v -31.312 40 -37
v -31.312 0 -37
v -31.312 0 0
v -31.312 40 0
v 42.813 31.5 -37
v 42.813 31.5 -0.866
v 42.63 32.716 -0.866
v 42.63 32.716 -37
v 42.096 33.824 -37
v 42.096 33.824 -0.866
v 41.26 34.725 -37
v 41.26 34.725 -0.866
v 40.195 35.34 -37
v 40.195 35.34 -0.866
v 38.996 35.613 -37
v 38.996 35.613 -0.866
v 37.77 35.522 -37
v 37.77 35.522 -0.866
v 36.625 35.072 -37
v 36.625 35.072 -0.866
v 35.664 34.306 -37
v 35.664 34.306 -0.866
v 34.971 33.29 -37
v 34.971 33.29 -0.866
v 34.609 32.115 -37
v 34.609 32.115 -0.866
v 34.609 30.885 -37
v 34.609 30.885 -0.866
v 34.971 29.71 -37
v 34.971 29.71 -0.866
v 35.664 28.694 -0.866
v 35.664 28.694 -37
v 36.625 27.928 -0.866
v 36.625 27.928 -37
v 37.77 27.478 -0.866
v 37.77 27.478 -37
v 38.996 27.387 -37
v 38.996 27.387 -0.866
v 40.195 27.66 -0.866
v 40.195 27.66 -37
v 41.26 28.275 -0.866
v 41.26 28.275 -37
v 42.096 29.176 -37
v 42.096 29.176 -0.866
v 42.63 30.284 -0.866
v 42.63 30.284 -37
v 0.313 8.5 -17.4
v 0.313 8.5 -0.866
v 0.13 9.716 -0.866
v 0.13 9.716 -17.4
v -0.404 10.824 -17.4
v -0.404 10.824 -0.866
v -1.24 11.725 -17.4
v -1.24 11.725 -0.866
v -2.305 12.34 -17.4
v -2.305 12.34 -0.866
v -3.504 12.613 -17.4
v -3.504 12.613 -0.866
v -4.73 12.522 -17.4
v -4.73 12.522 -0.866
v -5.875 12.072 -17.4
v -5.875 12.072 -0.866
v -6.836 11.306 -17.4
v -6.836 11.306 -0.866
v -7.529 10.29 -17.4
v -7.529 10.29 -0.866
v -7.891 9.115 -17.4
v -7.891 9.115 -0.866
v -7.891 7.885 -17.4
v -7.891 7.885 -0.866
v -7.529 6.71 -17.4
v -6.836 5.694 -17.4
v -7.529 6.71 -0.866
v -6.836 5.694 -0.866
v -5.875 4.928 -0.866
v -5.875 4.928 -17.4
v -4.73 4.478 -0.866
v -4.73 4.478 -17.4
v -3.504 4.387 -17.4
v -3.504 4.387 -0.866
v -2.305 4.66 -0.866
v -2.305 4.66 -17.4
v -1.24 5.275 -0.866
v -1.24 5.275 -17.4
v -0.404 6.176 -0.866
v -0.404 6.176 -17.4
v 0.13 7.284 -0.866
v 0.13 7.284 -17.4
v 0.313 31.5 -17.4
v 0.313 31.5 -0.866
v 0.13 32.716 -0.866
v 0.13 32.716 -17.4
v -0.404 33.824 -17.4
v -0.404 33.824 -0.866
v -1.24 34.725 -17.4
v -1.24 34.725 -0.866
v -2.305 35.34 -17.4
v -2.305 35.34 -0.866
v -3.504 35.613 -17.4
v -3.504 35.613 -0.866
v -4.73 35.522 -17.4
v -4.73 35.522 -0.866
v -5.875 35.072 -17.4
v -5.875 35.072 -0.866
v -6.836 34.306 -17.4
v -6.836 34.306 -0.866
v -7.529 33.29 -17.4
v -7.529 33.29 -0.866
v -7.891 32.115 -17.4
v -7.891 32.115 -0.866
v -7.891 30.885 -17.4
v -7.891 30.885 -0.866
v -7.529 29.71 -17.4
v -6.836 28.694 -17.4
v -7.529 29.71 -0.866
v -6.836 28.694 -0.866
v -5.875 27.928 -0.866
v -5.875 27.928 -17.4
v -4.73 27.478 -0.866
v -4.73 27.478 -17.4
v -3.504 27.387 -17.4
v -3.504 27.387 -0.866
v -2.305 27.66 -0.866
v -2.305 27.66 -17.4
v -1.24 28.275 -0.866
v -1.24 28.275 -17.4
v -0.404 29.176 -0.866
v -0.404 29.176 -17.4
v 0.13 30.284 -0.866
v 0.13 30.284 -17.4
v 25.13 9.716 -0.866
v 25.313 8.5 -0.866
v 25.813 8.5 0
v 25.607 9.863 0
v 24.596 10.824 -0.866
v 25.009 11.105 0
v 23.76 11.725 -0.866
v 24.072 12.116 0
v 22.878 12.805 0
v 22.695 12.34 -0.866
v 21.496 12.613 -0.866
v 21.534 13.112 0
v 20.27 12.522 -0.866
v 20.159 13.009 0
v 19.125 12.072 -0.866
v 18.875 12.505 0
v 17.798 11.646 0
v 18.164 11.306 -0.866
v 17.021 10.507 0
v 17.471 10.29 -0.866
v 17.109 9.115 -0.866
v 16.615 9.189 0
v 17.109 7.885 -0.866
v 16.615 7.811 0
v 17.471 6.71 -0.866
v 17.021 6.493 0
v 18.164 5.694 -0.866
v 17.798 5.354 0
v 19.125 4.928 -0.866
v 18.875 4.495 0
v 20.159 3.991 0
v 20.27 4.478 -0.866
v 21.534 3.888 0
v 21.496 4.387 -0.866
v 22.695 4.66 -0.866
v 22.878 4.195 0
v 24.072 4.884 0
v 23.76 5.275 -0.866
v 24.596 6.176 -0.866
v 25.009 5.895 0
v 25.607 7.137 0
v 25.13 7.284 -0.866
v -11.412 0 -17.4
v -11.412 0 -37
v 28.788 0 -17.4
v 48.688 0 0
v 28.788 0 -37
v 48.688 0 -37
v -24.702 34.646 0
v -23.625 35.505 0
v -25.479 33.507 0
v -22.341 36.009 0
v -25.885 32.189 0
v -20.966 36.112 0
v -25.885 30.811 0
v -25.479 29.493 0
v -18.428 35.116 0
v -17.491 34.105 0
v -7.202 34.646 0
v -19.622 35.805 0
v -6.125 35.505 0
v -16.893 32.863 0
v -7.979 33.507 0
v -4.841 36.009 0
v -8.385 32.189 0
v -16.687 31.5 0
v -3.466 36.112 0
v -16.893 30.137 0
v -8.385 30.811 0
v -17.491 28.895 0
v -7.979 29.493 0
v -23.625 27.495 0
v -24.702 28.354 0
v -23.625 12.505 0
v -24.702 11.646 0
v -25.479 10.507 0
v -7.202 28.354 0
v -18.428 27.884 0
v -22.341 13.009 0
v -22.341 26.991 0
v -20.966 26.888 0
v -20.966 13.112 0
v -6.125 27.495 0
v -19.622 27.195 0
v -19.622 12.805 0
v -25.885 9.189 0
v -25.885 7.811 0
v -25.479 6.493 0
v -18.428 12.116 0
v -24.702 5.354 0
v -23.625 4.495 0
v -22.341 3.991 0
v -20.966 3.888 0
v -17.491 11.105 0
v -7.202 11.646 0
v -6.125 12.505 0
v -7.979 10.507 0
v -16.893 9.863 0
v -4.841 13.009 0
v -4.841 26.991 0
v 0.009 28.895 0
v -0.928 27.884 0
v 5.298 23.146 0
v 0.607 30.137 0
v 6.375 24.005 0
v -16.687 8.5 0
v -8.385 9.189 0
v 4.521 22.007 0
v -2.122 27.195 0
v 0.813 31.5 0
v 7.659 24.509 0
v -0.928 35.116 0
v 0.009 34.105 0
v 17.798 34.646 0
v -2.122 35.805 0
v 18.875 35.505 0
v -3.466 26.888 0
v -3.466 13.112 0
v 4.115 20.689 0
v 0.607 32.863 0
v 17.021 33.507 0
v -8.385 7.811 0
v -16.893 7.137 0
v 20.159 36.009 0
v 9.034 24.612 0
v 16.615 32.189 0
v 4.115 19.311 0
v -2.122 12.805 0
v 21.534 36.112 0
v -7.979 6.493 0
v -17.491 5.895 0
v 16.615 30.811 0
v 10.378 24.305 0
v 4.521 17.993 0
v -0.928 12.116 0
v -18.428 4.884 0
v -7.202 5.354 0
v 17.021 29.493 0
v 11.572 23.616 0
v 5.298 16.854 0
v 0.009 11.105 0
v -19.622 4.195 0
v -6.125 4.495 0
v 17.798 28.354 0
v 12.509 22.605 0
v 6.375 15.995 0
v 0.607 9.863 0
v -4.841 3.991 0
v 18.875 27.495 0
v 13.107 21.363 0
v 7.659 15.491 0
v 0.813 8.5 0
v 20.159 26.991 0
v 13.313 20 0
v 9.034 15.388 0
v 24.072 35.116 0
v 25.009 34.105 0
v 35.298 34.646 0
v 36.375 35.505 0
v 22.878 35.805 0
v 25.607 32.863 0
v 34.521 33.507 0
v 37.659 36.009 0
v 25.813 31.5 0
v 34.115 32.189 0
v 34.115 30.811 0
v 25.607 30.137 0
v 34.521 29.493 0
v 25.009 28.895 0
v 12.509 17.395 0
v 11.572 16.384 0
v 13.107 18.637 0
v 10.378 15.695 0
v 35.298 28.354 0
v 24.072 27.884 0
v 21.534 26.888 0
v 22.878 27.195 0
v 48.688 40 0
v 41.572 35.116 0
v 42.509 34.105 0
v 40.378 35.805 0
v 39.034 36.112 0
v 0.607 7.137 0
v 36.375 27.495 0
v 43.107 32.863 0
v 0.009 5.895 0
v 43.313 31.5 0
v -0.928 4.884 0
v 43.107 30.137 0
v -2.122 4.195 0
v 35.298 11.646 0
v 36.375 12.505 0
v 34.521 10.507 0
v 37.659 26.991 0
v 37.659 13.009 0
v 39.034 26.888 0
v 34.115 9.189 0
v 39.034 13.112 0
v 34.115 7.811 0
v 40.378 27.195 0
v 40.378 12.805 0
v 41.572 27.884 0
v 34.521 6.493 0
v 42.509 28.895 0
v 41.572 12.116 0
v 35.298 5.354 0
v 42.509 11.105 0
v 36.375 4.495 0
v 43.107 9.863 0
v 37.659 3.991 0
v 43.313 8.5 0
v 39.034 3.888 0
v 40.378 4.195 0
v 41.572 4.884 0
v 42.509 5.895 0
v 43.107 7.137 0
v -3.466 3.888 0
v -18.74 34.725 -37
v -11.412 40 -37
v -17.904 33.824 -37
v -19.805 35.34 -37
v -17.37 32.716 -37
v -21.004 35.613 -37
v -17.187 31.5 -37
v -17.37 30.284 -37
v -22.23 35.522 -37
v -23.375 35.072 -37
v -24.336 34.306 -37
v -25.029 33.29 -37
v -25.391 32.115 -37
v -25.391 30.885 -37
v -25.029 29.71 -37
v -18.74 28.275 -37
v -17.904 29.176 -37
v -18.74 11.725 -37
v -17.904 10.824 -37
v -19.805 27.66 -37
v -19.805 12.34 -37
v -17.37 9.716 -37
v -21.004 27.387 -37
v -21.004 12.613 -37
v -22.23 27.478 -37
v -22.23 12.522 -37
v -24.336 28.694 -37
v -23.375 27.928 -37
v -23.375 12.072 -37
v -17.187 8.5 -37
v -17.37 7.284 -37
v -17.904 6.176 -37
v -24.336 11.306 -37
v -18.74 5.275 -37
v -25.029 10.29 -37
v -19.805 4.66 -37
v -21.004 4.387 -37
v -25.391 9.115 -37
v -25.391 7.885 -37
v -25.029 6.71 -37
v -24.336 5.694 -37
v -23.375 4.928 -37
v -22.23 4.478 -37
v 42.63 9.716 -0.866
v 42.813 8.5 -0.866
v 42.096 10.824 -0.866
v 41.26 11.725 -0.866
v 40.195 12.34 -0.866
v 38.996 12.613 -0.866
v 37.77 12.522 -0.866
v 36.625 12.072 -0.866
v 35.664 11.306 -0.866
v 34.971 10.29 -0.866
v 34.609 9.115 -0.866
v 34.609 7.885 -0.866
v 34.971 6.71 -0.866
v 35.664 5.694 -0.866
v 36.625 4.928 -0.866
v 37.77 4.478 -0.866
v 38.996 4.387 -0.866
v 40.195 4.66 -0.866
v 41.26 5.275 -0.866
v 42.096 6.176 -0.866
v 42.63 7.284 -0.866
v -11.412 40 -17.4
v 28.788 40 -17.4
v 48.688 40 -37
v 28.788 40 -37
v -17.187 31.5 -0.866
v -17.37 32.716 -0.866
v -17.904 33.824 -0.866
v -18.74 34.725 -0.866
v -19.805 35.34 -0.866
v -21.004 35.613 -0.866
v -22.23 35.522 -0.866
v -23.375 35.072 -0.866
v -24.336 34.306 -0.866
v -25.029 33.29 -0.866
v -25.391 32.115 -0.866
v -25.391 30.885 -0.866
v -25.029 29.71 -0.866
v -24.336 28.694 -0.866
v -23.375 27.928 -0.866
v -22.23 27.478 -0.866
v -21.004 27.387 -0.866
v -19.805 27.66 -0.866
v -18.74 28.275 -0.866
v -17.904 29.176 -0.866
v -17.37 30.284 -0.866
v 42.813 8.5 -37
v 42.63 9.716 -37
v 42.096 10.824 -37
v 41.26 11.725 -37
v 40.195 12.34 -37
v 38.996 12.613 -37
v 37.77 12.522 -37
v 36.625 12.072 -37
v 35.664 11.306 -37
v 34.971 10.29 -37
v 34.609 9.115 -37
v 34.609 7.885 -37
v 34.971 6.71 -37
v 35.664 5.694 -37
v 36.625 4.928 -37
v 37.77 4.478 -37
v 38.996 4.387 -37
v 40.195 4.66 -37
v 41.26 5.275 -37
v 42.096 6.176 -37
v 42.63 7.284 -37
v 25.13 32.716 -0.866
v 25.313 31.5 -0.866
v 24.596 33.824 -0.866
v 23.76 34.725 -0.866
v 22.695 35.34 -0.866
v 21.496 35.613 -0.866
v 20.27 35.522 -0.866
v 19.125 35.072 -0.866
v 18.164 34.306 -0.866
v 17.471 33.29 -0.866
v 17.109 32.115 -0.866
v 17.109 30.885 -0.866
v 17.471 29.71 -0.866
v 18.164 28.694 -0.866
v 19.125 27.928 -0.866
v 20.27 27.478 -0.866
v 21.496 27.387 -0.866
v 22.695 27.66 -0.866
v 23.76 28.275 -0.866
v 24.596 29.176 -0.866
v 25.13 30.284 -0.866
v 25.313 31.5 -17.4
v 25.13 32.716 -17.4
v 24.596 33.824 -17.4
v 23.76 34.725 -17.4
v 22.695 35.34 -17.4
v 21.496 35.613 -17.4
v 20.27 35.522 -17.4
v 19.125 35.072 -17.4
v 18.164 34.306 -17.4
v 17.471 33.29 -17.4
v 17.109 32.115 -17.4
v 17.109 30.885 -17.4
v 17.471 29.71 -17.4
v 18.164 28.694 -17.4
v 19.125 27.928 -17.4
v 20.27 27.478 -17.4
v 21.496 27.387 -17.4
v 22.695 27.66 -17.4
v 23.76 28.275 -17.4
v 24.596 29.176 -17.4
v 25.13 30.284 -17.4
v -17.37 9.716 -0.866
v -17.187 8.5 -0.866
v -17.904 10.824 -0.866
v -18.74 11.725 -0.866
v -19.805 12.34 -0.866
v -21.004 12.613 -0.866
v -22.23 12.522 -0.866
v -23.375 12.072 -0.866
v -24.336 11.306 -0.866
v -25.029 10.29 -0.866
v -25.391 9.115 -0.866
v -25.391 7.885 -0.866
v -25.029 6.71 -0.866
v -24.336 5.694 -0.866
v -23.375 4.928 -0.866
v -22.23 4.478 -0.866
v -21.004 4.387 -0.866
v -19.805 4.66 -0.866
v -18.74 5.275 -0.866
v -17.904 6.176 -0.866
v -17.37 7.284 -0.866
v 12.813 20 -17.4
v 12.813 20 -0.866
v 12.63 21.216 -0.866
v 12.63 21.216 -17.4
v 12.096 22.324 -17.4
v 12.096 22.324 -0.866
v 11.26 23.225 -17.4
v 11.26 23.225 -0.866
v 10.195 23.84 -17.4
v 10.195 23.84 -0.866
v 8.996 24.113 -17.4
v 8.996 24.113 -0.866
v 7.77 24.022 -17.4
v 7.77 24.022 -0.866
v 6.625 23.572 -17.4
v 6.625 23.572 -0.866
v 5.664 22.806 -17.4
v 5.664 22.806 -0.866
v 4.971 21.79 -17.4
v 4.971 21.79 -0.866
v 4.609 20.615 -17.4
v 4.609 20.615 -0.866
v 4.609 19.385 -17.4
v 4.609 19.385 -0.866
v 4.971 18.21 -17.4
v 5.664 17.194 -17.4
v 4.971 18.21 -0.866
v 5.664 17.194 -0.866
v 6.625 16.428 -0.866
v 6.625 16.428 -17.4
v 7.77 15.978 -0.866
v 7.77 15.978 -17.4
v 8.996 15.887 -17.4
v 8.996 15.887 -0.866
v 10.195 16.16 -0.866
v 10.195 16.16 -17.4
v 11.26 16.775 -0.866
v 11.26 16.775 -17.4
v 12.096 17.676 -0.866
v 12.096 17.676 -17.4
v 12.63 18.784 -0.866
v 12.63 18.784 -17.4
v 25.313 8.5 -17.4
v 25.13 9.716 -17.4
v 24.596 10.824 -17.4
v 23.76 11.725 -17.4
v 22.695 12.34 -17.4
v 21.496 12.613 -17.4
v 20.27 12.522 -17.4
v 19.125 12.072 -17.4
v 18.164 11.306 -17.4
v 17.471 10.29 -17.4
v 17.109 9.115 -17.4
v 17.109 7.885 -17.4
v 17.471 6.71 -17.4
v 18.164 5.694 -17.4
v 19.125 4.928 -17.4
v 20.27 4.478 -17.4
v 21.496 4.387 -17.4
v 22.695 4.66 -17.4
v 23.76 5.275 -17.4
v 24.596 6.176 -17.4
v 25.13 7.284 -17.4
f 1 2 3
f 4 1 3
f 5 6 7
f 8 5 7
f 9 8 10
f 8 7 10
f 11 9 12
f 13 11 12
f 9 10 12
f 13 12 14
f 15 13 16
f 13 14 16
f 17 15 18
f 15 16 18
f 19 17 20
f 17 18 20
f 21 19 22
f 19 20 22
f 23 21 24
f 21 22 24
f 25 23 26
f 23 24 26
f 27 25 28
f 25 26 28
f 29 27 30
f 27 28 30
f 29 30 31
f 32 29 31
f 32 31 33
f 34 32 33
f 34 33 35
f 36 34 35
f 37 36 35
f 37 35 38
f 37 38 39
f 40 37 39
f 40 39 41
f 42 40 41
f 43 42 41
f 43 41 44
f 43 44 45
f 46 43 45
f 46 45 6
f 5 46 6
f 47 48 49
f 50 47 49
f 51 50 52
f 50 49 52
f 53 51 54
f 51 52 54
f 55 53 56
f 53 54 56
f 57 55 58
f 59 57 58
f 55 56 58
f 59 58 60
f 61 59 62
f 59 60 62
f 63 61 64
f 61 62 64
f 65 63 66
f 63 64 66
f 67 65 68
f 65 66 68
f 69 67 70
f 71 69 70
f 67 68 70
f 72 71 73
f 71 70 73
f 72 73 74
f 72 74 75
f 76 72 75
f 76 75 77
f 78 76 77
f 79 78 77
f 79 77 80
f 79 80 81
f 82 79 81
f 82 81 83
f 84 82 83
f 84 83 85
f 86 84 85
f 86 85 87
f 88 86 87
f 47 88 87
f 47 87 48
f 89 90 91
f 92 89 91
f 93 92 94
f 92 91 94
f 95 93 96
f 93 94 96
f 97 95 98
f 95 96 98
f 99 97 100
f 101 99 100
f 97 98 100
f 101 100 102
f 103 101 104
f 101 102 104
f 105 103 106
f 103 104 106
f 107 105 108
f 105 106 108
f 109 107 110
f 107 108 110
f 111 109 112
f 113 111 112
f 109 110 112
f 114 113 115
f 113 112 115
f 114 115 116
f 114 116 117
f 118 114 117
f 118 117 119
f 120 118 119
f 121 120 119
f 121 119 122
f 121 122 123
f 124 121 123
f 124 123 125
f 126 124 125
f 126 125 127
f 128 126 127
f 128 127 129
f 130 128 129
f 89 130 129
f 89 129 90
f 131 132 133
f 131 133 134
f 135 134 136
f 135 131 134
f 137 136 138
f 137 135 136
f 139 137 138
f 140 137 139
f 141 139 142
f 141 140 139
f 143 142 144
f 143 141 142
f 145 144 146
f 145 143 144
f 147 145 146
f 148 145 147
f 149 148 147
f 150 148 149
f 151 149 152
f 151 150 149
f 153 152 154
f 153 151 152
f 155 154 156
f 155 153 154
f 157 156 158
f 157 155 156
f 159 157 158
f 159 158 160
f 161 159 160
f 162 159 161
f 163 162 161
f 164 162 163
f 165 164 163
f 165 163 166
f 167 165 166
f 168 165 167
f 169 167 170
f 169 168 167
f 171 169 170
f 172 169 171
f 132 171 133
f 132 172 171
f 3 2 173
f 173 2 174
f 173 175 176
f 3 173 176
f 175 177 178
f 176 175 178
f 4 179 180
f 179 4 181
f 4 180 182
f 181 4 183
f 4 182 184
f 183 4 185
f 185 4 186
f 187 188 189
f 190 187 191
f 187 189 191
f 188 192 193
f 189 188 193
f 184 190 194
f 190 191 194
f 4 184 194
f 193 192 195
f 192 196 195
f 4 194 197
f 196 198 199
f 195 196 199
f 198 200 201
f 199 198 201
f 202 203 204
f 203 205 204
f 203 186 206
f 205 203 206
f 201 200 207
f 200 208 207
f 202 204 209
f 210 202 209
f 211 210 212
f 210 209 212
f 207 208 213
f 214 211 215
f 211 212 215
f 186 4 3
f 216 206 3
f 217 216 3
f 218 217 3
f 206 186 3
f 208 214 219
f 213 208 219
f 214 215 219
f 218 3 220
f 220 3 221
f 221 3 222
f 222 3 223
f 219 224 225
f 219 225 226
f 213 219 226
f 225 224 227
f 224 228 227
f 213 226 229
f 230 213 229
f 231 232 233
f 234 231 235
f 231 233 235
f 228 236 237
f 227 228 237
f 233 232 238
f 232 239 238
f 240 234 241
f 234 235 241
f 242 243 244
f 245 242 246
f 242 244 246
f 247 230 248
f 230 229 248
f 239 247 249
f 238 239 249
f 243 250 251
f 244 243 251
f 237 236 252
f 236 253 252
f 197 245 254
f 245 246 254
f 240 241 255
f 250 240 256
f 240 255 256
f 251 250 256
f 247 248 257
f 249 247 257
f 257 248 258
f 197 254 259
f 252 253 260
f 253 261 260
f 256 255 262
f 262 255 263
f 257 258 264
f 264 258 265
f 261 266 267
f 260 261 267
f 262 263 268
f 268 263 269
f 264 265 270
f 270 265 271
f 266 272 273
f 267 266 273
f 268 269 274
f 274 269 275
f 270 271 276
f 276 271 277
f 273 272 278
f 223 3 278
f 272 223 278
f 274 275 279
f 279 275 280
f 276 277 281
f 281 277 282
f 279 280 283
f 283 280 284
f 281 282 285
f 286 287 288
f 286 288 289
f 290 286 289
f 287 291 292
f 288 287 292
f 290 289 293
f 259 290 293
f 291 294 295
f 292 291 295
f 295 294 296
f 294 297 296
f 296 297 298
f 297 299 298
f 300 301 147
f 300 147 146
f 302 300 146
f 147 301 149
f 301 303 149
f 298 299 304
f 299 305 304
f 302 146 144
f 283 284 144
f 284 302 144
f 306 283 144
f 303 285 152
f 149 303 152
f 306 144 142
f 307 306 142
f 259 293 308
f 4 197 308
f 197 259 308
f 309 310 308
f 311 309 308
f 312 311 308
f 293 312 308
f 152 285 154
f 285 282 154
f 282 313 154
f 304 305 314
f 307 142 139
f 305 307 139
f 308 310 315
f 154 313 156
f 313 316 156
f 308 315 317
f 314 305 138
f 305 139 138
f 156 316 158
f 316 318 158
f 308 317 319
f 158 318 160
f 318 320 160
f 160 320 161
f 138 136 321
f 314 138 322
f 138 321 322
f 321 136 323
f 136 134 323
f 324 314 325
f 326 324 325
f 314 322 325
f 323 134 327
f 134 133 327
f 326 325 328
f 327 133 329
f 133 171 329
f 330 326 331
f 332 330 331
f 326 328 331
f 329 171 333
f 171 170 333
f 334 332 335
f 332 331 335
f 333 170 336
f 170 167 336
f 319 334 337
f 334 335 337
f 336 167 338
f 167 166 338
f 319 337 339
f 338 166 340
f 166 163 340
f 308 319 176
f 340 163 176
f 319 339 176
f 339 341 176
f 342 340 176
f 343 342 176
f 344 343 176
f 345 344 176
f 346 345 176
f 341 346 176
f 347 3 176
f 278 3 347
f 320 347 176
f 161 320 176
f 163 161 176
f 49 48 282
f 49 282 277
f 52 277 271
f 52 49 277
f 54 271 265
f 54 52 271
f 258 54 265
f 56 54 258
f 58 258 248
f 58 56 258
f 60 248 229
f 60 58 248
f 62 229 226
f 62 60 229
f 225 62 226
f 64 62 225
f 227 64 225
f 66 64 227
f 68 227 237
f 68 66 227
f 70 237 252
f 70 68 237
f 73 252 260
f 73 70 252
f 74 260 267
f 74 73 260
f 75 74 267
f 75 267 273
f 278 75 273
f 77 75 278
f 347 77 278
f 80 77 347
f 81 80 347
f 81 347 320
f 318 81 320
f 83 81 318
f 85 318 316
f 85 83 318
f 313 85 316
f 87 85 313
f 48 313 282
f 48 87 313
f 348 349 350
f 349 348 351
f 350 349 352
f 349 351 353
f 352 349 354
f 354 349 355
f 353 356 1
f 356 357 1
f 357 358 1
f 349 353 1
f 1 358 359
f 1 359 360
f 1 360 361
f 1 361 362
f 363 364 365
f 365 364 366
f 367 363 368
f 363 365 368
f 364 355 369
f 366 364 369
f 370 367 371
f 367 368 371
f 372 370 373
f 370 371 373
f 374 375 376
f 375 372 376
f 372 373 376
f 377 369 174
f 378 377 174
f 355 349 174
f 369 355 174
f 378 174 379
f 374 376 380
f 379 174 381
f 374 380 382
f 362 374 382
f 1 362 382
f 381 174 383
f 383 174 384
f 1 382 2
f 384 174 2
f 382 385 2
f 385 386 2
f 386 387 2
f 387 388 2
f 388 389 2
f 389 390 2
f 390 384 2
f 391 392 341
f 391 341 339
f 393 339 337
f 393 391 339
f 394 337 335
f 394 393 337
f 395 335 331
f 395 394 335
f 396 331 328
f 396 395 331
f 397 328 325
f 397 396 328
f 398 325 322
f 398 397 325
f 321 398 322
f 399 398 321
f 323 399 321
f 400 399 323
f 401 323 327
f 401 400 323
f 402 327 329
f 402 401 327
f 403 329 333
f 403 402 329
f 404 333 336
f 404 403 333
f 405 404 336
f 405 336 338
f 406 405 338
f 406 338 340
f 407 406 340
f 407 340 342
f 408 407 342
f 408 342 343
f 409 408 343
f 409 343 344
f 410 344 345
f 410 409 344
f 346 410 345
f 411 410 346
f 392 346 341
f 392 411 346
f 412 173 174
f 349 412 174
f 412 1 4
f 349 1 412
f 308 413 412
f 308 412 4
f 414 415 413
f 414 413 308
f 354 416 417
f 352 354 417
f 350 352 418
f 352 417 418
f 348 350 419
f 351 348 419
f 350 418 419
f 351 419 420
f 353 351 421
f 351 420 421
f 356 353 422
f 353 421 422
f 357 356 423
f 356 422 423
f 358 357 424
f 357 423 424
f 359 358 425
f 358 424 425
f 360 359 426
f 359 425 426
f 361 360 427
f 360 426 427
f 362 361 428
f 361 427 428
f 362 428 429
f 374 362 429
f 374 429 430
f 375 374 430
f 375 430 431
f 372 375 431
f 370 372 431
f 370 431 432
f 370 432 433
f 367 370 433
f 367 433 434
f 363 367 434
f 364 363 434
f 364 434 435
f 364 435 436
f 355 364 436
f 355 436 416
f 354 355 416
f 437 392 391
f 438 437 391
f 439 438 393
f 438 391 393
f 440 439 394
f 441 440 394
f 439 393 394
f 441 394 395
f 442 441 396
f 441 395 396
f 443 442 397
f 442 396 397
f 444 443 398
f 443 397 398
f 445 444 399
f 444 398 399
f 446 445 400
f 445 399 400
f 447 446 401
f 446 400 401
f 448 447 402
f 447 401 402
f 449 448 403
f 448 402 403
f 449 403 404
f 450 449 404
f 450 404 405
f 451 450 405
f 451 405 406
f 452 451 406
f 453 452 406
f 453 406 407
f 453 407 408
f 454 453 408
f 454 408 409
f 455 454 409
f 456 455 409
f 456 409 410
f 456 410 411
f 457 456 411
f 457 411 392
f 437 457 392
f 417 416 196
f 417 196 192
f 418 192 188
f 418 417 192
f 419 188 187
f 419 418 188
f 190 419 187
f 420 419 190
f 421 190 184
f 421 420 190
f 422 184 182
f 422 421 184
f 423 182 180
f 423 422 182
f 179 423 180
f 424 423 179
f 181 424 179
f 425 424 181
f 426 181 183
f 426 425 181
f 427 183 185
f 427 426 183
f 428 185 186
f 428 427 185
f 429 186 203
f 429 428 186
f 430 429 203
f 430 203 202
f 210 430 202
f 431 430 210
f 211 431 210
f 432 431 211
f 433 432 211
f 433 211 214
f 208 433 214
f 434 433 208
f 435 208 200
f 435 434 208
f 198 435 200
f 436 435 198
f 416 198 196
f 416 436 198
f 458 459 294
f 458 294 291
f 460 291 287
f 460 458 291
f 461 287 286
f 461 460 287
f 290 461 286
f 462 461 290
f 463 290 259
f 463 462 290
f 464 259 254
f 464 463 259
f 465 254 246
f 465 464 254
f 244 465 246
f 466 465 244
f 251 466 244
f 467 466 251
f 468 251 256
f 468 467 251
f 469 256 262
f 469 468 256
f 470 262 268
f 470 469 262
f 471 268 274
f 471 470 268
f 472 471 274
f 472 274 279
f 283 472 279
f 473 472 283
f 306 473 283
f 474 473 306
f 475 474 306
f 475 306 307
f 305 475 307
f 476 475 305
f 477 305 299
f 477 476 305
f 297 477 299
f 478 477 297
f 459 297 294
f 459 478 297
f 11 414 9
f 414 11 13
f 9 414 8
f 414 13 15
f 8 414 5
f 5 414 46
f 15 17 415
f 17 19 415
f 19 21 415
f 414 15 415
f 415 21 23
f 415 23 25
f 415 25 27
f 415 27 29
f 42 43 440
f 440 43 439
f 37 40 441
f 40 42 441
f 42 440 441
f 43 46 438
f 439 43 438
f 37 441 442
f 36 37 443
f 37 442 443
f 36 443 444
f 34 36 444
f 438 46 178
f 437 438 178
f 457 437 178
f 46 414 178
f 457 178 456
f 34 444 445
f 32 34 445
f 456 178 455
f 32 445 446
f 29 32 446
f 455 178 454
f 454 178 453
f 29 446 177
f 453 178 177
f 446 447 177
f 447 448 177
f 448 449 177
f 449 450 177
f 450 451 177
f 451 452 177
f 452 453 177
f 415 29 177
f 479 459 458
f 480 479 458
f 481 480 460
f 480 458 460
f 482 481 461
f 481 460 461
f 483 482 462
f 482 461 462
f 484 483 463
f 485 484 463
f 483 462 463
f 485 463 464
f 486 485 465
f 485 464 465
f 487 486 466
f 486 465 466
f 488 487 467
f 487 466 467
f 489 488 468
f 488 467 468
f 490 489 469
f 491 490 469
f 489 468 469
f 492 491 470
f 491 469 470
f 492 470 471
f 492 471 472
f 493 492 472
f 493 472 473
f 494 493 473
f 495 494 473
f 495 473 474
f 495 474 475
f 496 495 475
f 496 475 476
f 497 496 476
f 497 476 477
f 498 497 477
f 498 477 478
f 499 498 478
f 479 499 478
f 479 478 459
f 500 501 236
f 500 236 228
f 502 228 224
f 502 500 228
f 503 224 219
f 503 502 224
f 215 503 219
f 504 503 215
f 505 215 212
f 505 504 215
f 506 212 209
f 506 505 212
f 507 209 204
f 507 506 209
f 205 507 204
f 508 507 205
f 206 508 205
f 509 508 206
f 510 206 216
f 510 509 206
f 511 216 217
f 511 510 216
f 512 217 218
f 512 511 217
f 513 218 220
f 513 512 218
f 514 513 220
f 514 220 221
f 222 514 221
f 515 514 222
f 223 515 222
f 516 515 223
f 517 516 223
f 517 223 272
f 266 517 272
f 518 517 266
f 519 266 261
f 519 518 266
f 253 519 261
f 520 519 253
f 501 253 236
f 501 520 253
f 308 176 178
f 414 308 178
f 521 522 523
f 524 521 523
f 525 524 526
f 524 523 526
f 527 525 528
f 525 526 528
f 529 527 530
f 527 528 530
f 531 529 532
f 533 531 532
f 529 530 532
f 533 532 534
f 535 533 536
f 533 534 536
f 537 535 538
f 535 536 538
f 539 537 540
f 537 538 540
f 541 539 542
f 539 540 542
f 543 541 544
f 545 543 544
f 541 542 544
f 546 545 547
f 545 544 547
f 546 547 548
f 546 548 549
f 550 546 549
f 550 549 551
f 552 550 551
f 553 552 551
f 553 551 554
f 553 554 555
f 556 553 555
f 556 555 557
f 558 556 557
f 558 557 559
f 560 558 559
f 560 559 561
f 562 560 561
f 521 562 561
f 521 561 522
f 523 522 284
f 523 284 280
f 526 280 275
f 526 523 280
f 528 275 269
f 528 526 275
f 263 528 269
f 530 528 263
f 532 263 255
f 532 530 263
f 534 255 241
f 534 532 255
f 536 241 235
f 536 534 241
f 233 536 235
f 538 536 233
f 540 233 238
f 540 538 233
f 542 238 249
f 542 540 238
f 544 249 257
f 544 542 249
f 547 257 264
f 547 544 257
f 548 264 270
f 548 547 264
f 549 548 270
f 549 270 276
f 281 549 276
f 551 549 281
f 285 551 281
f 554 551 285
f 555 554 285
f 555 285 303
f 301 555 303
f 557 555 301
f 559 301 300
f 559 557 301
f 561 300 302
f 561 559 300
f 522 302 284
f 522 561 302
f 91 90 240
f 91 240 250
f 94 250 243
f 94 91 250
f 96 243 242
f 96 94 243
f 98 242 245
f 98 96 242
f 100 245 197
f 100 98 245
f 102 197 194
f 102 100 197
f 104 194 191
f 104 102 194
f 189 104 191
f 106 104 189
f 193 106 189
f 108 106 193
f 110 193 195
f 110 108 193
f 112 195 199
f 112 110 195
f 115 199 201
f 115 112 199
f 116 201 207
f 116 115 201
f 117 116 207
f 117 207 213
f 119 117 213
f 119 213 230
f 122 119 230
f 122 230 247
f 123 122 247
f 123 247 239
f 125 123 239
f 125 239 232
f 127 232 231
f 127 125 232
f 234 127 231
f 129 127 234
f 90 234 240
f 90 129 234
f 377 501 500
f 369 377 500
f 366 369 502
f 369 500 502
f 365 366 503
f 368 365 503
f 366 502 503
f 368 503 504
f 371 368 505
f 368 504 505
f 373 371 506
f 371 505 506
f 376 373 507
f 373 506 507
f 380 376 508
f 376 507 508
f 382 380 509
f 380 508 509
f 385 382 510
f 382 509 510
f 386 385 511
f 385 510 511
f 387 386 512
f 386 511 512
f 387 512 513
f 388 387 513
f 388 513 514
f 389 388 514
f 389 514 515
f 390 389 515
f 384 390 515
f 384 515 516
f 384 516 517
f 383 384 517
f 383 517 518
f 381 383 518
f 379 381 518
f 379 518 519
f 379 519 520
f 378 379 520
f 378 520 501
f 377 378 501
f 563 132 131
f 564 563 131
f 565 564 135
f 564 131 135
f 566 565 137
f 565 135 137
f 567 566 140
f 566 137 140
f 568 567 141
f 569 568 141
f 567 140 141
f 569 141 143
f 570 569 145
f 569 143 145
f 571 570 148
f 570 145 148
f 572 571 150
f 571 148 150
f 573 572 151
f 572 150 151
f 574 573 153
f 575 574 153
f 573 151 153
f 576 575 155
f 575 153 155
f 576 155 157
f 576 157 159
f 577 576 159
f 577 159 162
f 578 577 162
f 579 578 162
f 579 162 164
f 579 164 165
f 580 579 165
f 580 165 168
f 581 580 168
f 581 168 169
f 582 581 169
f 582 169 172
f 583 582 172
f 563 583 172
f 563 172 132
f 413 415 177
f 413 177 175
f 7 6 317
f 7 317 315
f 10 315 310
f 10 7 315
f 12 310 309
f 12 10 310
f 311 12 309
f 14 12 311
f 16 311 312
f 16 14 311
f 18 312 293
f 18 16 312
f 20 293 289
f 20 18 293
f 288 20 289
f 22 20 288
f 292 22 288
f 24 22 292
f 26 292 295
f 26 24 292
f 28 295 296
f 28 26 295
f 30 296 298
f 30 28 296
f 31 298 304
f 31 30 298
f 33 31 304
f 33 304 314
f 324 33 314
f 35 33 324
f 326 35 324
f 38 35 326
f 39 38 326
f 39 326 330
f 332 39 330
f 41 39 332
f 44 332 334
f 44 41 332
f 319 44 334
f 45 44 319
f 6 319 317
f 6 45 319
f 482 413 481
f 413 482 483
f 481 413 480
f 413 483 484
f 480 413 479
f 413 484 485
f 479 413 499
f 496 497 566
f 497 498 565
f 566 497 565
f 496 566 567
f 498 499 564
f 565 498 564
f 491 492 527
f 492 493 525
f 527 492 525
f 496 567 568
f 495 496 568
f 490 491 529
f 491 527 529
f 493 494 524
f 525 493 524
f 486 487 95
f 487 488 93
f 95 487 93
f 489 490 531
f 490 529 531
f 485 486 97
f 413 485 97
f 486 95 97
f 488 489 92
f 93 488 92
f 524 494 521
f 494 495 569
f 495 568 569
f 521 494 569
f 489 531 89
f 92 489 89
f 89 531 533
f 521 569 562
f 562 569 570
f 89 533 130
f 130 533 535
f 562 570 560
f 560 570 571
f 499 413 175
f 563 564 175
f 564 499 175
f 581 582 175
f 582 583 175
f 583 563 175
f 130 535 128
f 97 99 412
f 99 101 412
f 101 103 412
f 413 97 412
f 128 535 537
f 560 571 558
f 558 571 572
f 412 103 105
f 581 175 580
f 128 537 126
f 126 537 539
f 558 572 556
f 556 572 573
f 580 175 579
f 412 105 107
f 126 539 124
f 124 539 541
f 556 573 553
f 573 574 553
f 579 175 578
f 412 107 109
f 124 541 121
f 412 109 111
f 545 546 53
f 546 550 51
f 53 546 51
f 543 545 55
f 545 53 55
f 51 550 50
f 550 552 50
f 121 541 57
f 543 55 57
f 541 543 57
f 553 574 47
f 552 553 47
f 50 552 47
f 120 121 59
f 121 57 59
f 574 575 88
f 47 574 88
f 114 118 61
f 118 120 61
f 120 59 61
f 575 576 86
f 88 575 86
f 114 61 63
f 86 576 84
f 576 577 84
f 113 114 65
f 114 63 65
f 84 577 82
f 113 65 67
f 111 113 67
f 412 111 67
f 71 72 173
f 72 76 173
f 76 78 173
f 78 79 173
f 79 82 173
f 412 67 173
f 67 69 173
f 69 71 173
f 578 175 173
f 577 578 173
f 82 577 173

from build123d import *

# Parameters (mm, degrees)
BOSS_EXTRUDE2_DEPTH = 40
SKETCH3_R           = 4.125
CUT_EXTRUDE1_DEPTH  = 38
CHAMFER1_SIZE       = 0.5
CHAMFER1_SIZE2      = 0.866025404


with BuildPart() as part:
    # Sketch2 → Boss-Extrude2 (new body)
    with BuildSketch(Plane(origin=(0, 0, 0), x_dir=(1, 0, 0), z_dir=(0, 1, 0))):
        Polygon((-31.312103746, 37), (-31.312103746, 0), (48.687896254, 0), (48.687896254, 37), (28.787896254, 37), (28.787896254, 17.4), (-11.412103746, 17.4), (-11.412103746, 37), align=None)
    extrude(amount=BOSS_EXTRUDE2_DEPTH)

    # Sketch3 → Cut-Extrude1 (cut, through all)
    with BuildSketch(Plane.XY):
        with Locations((-3.812103746, 31.5)):
            Circle(SKETCH3_R)
        with Locations((21.187896254, 31.5)):
            Circle(SKETCH3_R)
        with Locations((21.187896254, 8.5)):
            Circle(SKETCH3_R)
        with Locations((-3.812103746, 8.5)):
            Circle(SKETCH3_R)
        with Locations((-21.312103746, 31.5)):
            Circle(SKETCH3_R)
        with Locations((38.687896254, 31.5)):
            Circle(SKETCH3_R)
        with Locations((38.687896254, 8.5)):
            Circle(SKETCH3_R)
        with Locations((-21.312103746, 8.5)):
            Circle(SKETCH3_R)
        with Locations((8.687896254, 20)):
            Circle(SKETCH3_R)
    extrude(amount=-CUT_EXTRUDE1_DEPTH, mode=Mode.SUBTRACT)

    # Chamfer1
    chamfer1_edges = [part.edges().sort_by_distance(p)[0] for p in [
        (-7.937103746, 31.5, 0),
        (4.562896254, 20, 0),
        (-25.437103746, 8.5, 0),
        (34.562896254, 8.5, 0),
        (34.562896254, 31.5, 0),
        (-25.437103746, 31.5, 0),
        (-7.937103746, 8.5, 0),
        (17.062896254, 8.5, 0),
        (17.062896254, 31.5, 0),
    ]]
    chamfer1_side = [part.faces().sort_by_distance(p)[0] for p in [
        (-30.417676555, 20, 0),
    ]]
    chamfer(chamfer1_edges, length=CHAMFER1_SIZE, length2=CHAMFER1_SIZE2, reference=chamfer1_side[0])


solid = part.part
